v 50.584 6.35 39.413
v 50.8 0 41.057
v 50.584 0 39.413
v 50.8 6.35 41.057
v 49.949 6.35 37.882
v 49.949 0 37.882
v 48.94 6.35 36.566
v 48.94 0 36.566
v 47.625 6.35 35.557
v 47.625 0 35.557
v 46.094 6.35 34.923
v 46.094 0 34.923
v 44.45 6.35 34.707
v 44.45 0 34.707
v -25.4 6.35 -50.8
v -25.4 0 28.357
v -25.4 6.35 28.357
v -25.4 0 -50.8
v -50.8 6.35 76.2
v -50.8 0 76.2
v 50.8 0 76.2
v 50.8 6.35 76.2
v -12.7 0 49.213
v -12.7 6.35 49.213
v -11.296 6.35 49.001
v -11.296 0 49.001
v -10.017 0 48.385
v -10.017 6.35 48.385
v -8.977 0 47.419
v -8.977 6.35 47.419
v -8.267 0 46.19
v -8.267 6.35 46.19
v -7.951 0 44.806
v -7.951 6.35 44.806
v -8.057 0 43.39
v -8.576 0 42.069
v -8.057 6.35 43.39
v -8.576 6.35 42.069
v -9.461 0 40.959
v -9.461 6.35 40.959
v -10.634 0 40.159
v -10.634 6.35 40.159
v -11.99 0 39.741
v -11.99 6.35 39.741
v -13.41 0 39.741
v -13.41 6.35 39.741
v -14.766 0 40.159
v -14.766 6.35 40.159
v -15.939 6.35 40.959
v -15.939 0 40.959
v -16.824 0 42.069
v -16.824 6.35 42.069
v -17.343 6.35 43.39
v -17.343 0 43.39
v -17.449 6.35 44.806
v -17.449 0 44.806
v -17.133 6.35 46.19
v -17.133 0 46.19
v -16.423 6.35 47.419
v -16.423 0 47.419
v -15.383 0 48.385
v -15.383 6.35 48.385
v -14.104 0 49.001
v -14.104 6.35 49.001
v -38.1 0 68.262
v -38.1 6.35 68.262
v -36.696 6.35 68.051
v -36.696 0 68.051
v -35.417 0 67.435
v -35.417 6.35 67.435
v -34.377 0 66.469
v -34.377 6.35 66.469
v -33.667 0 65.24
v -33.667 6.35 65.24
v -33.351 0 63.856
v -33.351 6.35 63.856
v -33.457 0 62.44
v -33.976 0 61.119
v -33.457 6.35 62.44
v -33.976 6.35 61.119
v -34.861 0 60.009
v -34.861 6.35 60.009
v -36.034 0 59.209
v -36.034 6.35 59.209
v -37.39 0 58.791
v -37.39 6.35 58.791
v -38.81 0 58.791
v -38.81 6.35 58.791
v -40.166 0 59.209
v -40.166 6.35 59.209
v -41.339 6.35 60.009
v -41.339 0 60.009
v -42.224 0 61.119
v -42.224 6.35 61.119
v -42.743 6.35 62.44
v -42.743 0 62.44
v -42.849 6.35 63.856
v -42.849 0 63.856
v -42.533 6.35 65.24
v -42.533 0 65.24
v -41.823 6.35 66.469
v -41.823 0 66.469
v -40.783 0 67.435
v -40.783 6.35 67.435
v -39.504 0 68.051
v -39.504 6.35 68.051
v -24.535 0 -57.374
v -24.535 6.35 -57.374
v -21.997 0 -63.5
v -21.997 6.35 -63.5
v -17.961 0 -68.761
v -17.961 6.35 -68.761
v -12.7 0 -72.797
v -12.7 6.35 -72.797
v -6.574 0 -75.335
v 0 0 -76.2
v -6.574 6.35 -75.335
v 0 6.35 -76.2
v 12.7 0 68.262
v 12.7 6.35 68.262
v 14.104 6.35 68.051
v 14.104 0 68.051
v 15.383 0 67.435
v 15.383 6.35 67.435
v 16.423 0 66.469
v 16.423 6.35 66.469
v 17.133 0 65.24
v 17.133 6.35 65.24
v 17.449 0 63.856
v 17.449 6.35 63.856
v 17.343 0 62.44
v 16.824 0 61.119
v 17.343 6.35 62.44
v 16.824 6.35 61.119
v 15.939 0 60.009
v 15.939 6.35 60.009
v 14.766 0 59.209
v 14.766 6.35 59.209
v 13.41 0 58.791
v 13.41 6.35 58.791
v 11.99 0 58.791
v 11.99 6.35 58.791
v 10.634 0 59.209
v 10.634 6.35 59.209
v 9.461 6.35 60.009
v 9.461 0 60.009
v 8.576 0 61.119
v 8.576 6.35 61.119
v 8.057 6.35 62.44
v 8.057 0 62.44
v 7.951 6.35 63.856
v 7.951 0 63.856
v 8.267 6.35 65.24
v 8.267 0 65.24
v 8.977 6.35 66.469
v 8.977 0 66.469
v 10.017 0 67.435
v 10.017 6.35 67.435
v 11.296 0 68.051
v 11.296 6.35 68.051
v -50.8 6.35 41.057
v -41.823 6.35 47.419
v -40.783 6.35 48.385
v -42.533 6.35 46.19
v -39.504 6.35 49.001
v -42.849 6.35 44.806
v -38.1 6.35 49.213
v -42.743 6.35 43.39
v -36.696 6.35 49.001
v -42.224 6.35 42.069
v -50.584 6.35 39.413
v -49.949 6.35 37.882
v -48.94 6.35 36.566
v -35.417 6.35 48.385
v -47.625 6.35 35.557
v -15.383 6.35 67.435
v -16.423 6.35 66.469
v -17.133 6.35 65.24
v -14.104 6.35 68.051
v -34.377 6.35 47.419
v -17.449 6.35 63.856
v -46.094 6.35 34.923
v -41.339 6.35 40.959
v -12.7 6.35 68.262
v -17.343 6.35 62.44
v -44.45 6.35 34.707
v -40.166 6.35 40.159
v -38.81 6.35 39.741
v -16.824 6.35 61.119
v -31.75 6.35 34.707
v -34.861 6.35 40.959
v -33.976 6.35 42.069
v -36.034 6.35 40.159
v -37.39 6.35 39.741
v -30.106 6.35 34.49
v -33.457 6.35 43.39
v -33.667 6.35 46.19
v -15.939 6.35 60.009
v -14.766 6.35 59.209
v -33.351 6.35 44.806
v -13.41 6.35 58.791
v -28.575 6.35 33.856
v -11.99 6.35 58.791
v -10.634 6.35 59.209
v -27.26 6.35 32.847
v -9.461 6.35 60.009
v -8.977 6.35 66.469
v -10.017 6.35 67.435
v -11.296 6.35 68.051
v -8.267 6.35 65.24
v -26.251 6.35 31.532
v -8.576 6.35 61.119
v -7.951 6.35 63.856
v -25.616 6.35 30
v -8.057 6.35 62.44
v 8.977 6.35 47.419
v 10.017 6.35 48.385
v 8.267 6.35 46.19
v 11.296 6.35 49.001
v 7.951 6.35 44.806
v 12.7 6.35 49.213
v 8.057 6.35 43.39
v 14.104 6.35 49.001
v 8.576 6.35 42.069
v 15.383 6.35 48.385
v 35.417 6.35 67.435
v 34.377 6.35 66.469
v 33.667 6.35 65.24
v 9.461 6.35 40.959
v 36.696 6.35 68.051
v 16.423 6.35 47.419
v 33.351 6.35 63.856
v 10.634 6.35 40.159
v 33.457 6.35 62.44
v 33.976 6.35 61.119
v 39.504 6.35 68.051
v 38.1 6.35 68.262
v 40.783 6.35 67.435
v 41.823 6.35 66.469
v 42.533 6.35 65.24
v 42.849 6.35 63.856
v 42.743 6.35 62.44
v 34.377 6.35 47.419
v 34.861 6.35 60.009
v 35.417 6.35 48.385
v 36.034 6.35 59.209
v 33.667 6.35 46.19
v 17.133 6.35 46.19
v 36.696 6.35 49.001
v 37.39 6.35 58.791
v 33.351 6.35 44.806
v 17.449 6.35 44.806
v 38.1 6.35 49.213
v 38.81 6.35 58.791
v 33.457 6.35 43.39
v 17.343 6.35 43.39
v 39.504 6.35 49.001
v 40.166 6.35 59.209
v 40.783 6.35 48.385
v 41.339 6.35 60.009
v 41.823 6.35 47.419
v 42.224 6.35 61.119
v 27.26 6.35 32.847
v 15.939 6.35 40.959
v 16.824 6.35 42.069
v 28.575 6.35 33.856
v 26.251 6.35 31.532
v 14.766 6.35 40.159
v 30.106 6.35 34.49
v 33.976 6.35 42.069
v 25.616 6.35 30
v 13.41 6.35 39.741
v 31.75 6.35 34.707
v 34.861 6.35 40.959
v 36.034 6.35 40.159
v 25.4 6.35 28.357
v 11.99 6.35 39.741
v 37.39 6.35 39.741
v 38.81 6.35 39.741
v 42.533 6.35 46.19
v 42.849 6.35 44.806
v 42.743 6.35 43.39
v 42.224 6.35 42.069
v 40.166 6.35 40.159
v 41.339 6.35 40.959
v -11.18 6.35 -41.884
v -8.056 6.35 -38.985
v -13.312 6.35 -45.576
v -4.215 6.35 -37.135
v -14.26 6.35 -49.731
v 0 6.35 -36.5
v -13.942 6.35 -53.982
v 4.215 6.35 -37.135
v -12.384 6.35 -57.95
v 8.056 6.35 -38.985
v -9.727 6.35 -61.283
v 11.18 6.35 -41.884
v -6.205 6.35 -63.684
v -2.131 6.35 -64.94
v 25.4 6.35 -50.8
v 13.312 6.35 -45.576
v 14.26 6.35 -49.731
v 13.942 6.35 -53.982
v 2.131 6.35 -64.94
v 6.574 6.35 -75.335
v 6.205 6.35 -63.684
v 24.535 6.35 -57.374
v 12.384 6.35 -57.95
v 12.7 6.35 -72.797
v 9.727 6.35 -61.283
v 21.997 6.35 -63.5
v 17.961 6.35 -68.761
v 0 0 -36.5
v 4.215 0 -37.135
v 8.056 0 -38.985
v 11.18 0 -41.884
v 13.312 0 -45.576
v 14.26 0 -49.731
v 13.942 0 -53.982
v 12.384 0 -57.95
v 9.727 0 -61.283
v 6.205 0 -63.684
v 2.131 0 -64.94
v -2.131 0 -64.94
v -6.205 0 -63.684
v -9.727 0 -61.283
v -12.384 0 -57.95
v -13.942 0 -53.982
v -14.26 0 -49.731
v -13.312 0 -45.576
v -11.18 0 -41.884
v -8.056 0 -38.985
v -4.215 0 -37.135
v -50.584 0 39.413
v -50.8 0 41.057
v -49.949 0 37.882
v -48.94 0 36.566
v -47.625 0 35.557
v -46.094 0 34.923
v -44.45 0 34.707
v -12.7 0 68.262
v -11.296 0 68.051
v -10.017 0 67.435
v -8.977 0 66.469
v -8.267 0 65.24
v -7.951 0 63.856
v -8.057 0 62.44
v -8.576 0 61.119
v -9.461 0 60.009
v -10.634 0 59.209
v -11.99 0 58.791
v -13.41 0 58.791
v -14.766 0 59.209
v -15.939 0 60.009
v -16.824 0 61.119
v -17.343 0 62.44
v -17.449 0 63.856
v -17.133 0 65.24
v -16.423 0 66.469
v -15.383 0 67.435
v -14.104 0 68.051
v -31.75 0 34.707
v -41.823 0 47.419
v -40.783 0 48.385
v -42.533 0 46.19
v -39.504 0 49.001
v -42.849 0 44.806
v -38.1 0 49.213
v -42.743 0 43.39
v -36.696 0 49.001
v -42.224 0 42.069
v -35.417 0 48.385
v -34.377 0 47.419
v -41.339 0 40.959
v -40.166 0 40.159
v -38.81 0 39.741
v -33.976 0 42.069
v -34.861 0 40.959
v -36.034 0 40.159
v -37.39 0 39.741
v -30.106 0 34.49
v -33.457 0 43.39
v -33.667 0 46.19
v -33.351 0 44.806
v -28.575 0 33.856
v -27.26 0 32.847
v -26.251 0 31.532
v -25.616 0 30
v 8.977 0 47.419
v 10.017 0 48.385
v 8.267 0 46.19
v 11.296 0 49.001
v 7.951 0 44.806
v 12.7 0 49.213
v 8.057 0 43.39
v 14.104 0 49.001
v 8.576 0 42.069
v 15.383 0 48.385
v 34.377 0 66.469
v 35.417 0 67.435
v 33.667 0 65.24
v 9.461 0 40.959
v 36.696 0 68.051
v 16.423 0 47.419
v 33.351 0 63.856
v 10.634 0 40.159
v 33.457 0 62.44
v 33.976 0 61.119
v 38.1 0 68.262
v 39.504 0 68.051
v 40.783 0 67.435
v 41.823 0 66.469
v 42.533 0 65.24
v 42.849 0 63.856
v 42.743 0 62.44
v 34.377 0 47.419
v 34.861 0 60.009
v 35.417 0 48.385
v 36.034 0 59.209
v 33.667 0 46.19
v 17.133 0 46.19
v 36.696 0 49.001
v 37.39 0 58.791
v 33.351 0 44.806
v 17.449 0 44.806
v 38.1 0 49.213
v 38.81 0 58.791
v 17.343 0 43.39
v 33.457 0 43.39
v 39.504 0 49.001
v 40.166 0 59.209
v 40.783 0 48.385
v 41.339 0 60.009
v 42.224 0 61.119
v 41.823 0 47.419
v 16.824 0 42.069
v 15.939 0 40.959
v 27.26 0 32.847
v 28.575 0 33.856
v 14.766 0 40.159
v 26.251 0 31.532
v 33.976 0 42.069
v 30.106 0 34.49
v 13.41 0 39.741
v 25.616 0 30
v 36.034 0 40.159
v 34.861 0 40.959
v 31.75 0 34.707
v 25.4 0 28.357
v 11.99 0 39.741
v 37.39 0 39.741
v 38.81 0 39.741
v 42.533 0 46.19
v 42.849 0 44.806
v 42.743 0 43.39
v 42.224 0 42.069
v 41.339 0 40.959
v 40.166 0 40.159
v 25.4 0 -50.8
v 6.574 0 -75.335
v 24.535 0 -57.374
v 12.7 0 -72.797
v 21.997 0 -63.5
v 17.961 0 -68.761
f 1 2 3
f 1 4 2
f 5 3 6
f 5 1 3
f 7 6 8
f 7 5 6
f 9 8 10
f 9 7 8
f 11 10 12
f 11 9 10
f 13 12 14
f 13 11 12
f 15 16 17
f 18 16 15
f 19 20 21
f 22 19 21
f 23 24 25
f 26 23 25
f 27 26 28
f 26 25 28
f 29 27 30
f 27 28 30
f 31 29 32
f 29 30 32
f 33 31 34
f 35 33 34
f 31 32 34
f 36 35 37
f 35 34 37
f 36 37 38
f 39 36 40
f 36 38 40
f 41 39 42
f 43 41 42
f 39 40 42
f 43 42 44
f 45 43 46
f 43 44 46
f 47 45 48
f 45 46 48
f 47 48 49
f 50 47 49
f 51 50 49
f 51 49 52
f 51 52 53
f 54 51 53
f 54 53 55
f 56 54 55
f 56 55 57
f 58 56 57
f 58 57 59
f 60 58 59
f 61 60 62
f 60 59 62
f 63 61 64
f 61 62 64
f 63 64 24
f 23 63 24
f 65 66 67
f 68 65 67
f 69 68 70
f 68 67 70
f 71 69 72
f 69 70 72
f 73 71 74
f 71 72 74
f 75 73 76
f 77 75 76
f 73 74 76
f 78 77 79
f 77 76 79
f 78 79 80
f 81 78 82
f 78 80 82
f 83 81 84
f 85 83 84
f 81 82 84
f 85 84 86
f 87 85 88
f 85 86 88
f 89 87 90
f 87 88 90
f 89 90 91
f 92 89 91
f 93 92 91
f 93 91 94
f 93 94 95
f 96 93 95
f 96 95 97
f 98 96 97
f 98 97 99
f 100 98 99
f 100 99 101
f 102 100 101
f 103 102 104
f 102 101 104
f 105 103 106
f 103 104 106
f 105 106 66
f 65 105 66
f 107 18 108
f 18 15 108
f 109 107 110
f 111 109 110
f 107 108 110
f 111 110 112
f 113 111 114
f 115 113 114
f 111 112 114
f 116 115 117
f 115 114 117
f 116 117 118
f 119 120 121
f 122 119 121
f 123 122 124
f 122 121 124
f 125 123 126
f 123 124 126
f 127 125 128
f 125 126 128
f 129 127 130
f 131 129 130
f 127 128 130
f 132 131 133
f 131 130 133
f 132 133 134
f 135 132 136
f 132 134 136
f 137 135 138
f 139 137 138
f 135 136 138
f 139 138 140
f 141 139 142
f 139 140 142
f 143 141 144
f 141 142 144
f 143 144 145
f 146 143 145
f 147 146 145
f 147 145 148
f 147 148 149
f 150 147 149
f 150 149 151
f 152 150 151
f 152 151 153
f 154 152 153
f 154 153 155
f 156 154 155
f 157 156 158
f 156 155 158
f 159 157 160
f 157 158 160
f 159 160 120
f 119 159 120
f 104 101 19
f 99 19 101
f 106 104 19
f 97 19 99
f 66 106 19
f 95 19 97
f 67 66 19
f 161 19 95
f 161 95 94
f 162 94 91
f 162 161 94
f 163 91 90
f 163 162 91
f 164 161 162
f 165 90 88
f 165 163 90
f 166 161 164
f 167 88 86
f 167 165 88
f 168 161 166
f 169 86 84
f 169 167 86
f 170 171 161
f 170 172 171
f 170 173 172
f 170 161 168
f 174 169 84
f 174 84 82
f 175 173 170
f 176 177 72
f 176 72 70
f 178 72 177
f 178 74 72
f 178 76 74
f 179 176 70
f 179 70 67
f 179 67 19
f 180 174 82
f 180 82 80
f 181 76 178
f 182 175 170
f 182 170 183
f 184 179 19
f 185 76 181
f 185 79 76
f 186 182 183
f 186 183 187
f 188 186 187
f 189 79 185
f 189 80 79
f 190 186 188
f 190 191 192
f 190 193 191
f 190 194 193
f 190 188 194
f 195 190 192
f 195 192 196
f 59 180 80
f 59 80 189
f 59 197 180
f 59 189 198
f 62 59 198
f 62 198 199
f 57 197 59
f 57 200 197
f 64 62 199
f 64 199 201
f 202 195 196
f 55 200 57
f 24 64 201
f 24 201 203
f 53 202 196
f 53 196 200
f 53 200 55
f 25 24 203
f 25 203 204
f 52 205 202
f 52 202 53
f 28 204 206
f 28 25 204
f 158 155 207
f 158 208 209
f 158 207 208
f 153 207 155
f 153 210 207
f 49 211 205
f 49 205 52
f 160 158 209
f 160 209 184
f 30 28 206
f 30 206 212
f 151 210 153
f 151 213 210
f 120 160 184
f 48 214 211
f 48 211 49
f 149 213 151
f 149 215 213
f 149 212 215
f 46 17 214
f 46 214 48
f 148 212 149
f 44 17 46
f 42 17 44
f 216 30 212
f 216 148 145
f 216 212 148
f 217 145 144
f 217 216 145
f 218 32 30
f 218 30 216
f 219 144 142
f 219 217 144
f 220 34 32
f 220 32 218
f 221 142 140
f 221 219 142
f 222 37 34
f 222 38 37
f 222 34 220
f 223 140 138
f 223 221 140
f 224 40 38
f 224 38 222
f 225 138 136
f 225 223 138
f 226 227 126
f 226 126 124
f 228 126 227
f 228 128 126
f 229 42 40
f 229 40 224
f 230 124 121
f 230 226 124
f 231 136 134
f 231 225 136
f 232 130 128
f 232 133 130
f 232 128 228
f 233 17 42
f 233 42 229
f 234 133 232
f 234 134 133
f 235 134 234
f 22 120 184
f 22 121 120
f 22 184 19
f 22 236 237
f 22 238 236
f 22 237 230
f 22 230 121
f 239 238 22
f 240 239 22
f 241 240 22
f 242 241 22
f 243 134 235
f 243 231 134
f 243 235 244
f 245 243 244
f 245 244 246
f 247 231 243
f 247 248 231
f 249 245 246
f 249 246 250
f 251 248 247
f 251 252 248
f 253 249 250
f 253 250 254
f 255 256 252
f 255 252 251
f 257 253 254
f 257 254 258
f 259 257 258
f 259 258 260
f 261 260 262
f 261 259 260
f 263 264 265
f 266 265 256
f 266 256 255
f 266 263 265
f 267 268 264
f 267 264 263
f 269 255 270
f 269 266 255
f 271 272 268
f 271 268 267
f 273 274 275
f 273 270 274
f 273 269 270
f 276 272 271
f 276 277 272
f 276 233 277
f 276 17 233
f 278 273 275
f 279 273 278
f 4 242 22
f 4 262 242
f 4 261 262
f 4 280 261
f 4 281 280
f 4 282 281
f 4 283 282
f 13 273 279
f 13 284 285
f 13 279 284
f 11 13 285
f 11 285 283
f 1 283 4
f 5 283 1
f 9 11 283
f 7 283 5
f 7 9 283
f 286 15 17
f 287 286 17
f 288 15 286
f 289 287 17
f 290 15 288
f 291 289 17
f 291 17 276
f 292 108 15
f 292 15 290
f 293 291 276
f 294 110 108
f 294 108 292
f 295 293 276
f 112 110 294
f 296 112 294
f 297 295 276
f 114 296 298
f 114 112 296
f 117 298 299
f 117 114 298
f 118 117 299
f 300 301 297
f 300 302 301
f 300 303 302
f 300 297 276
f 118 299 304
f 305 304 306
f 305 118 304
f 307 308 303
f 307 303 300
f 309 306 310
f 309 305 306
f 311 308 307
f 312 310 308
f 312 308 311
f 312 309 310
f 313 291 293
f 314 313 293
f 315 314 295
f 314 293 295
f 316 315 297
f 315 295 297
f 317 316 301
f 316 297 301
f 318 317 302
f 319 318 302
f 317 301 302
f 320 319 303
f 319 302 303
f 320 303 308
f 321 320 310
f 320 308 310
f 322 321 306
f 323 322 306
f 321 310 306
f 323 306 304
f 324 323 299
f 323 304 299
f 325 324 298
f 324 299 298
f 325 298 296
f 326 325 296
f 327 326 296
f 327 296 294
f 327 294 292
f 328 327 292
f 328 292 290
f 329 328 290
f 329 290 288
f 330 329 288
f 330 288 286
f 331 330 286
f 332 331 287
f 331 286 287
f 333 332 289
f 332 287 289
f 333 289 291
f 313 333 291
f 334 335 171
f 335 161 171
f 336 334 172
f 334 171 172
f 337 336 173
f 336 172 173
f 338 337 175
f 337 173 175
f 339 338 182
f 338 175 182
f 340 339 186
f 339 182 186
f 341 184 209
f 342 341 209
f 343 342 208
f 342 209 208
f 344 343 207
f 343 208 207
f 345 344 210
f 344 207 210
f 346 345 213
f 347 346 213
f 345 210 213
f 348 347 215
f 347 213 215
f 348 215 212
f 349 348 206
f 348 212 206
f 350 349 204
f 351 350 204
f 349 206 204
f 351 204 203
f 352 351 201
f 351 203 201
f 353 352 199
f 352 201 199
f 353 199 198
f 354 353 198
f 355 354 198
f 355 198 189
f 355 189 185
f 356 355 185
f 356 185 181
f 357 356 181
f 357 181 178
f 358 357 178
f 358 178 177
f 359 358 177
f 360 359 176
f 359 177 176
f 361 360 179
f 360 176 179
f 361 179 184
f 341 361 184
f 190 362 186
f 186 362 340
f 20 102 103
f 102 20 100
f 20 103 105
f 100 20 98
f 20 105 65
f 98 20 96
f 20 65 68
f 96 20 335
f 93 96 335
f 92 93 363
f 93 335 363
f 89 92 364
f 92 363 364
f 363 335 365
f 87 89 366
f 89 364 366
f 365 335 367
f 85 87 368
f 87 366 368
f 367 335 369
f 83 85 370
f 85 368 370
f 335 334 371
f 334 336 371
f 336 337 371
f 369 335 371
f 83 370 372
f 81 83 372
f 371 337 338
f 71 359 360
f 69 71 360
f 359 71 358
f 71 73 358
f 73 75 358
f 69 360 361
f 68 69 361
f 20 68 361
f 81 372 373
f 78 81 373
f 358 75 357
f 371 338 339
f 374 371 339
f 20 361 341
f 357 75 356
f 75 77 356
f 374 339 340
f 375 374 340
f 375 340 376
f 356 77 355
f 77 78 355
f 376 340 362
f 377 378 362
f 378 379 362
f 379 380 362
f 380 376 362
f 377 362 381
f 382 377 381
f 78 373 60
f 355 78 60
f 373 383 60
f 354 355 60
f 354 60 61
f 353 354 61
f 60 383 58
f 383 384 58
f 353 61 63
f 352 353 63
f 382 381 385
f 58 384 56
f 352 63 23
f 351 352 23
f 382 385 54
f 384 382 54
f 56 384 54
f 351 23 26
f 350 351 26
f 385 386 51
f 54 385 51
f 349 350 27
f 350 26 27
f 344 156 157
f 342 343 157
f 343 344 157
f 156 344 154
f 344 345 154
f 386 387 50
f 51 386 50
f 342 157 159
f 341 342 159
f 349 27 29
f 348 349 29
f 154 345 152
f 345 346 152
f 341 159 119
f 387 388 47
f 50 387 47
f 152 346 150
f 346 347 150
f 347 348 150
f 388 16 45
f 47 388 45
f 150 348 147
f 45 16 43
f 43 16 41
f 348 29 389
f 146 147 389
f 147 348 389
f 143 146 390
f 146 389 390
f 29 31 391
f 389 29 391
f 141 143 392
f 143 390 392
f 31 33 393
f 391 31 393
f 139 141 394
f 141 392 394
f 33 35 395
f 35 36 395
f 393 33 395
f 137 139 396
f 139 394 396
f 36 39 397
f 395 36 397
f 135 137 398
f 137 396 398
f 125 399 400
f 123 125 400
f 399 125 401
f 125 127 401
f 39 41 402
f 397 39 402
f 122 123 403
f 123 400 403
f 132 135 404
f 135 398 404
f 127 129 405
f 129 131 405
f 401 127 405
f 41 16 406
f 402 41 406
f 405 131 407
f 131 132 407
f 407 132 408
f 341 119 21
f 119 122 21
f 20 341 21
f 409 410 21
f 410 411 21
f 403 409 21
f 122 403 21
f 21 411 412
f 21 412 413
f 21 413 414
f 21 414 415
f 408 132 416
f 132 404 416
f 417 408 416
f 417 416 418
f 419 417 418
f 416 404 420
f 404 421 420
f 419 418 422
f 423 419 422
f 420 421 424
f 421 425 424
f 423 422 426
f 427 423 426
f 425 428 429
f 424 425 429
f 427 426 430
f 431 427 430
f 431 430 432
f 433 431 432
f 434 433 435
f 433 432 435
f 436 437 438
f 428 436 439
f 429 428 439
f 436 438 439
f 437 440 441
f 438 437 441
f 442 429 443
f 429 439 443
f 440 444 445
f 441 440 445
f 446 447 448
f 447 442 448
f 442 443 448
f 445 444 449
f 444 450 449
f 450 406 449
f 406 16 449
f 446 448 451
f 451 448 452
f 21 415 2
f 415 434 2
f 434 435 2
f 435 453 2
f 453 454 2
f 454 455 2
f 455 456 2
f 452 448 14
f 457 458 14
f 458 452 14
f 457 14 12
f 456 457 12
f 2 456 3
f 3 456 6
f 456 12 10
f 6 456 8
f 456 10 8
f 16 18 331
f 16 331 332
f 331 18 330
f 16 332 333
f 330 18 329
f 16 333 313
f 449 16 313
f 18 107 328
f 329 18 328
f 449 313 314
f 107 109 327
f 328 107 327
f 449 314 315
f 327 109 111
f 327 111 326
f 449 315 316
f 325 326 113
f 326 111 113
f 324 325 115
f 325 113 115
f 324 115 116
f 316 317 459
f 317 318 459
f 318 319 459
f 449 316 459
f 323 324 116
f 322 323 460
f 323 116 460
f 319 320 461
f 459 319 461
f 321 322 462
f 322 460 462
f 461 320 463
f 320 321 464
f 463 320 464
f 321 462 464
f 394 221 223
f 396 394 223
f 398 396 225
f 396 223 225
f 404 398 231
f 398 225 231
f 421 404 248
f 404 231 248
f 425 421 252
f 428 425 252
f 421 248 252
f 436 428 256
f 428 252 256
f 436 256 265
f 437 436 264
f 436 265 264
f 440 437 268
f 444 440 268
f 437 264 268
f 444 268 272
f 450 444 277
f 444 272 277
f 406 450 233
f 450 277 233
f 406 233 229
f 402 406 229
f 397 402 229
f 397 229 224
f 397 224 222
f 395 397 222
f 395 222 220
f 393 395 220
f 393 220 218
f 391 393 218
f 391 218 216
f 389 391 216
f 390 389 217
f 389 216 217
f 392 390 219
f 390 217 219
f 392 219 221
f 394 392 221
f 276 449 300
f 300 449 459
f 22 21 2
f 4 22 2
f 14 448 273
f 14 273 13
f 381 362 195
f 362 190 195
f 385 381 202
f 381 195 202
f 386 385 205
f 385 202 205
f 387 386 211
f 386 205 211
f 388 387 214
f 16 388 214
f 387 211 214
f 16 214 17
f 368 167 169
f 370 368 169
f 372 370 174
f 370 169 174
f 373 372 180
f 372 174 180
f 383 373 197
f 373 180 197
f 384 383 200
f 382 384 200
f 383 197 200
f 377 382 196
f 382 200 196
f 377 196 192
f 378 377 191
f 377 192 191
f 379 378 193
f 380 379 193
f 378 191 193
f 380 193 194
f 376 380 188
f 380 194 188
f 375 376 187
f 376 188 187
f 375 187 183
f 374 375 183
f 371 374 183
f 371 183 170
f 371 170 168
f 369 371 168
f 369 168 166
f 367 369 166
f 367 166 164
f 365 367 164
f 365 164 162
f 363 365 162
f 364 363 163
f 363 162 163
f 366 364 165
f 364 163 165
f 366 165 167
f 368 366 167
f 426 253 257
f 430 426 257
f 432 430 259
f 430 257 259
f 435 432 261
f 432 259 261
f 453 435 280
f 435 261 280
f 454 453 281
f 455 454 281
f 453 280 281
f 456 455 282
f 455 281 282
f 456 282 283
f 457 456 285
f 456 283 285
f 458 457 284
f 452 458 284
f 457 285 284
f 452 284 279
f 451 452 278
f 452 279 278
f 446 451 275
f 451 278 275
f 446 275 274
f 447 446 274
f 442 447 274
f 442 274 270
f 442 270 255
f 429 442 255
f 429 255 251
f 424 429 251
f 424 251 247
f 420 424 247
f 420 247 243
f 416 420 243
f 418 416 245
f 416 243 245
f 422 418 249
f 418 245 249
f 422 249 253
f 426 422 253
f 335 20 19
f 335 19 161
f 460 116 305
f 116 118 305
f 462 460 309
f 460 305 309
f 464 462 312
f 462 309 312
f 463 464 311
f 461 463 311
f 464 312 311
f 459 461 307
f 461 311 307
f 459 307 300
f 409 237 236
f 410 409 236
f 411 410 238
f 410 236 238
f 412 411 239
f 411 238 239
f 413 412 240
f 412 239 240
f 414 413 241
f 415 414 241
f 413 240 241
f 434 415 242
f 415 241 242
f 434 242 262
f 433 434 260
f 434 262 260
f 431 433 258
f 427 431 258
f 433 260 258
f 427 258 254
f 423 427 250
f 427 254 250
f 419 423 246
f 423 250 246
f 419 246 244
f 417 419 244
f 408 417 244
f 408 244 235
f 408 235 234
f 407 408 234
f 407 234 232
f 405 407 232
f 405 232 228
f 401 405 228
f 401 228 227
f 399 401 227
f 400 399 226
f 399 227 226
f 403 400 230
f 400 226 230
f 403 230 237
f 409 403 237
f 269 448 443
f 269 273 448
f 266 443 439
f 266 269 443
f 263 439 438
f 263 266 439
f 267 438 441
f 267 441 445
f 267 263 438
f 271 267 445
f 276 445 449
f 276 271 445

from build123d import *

# Parameters (mm, degrees)
SKETCH1_W            = 25.4
SKETCH1_H            = 41.493412961
SKETCH1_W_2          = 50.8
SKETCH1_H_2          = 110.906587039
BOSS_EXTRUDE1_DEPTH  = 6.35
SKETCH2_R            = 14.3002
CUT_EXTRUDE1_DEPTH   = 6.35
SKETCH3_R            = 4.7625
CUT_EXTRUDE2_DEPTH   = 6.35
LPATTERN1_COUNT      = 4
LPATTERN1_PITCH      = 25.4
LPATTERN1_COUNT_DIR2 = 2
LPATTERN1_PITCH_DIR2 = 19.05
FILLET1_R            = 6.35
FILLET2_R            = 25.4


with BuildPart() as part:
    # Sketch1 → Boss-Extrude1 (new body)
    with BuildSketch(Plane(origin=(0, 0, 0), x_dir=(1, 0, 0), z_dir=(0, 1, 0))):
        with Locations((-38.1, -55.45329352)):
            Rectangle(SKETCH1_W, SKETCH1_H)
        with Locations((0, -55.45329352)):
            Rectangle(SKETCH1_W_2, SKETCH1_H)
        with Locations((0, 20.746706481)):
            Rectangle(SKETCH1_W_2, SKETCH1_H_2)
        with Locations((38.1, -55.45329352)):
            Rectangle(SKETCH1_W, SKETCH1_H)
    extrude(amount=BOSS_EXTRUDE1_DEPTH)

    # Sketch2 → Cut-Extrude1 (cut)
    with BuildSketch(Plane(origin=(0, 6.35, 0), x_dir=(1, 0, 0), z_dir=(0, 1, 0))):
        with Locations(Location((0, 50.8, 0), (0, 0, 270))):
            Circle(SKETCH2_R)
    extrude(amount=-CUT_EXTRUDE1_DEPTH, mode=Mode.SUBTRACT)

    # Sketch3 → Cut-Extrude2 (cut)
    with BuildSketch(Plane(origin=(0, 6.35, 0), x_dir=(1, 0, 0), z_dir=(0, 1, 0))):
        with Locations(Location((-38.1, -63.5, 0), (0, 0, 270))):
            Circle(SKETCH3_R)
    cut_extrude2 = extrude(amount=-CUT_EXTRUDE2_DEPTH, mode=Mode.SUBTRACT)

    # LPattern1: Cut-Extrude2 4 × 2
    with Locations(*[(i * LPATTERN1_PITCH, 0, -j * LPATTERN1_PITCH_DIR2) for i in range(LPATTERN1_COUNT) for j in range(LPATTERN1_COUNT_DIR2) if (i, j) != (0, 0)]):
        add(cut_extrude2, mode=Mode.SUBTRACT)

    # Fillet1
    fillet1_edges = [part.edges().sort_by_distance(p)[0] for p in [
        (-50.8, 3.175, 34.706587039),
        (-25.4, 3.175, 34.706587039),
        (25.4, 3.175, 34.706587039),
        (50.8, 3.175, 34.706587039),
    ]]
    fillet(fillet1_edges, radius=FILLET1_R)

    # Fillet2
    fillet2_edges = [part.edges().sort_by_distance(p)[0] for p in [
        (25.4, 3.175, -76.2),
        (-25.4, 3.175, -76.2),
    ]]
    fillet(fillet2_edges, radius=FILLET2_R - 0.0001)  # a hair under: the kernel refuses the full size


solid = part.part
